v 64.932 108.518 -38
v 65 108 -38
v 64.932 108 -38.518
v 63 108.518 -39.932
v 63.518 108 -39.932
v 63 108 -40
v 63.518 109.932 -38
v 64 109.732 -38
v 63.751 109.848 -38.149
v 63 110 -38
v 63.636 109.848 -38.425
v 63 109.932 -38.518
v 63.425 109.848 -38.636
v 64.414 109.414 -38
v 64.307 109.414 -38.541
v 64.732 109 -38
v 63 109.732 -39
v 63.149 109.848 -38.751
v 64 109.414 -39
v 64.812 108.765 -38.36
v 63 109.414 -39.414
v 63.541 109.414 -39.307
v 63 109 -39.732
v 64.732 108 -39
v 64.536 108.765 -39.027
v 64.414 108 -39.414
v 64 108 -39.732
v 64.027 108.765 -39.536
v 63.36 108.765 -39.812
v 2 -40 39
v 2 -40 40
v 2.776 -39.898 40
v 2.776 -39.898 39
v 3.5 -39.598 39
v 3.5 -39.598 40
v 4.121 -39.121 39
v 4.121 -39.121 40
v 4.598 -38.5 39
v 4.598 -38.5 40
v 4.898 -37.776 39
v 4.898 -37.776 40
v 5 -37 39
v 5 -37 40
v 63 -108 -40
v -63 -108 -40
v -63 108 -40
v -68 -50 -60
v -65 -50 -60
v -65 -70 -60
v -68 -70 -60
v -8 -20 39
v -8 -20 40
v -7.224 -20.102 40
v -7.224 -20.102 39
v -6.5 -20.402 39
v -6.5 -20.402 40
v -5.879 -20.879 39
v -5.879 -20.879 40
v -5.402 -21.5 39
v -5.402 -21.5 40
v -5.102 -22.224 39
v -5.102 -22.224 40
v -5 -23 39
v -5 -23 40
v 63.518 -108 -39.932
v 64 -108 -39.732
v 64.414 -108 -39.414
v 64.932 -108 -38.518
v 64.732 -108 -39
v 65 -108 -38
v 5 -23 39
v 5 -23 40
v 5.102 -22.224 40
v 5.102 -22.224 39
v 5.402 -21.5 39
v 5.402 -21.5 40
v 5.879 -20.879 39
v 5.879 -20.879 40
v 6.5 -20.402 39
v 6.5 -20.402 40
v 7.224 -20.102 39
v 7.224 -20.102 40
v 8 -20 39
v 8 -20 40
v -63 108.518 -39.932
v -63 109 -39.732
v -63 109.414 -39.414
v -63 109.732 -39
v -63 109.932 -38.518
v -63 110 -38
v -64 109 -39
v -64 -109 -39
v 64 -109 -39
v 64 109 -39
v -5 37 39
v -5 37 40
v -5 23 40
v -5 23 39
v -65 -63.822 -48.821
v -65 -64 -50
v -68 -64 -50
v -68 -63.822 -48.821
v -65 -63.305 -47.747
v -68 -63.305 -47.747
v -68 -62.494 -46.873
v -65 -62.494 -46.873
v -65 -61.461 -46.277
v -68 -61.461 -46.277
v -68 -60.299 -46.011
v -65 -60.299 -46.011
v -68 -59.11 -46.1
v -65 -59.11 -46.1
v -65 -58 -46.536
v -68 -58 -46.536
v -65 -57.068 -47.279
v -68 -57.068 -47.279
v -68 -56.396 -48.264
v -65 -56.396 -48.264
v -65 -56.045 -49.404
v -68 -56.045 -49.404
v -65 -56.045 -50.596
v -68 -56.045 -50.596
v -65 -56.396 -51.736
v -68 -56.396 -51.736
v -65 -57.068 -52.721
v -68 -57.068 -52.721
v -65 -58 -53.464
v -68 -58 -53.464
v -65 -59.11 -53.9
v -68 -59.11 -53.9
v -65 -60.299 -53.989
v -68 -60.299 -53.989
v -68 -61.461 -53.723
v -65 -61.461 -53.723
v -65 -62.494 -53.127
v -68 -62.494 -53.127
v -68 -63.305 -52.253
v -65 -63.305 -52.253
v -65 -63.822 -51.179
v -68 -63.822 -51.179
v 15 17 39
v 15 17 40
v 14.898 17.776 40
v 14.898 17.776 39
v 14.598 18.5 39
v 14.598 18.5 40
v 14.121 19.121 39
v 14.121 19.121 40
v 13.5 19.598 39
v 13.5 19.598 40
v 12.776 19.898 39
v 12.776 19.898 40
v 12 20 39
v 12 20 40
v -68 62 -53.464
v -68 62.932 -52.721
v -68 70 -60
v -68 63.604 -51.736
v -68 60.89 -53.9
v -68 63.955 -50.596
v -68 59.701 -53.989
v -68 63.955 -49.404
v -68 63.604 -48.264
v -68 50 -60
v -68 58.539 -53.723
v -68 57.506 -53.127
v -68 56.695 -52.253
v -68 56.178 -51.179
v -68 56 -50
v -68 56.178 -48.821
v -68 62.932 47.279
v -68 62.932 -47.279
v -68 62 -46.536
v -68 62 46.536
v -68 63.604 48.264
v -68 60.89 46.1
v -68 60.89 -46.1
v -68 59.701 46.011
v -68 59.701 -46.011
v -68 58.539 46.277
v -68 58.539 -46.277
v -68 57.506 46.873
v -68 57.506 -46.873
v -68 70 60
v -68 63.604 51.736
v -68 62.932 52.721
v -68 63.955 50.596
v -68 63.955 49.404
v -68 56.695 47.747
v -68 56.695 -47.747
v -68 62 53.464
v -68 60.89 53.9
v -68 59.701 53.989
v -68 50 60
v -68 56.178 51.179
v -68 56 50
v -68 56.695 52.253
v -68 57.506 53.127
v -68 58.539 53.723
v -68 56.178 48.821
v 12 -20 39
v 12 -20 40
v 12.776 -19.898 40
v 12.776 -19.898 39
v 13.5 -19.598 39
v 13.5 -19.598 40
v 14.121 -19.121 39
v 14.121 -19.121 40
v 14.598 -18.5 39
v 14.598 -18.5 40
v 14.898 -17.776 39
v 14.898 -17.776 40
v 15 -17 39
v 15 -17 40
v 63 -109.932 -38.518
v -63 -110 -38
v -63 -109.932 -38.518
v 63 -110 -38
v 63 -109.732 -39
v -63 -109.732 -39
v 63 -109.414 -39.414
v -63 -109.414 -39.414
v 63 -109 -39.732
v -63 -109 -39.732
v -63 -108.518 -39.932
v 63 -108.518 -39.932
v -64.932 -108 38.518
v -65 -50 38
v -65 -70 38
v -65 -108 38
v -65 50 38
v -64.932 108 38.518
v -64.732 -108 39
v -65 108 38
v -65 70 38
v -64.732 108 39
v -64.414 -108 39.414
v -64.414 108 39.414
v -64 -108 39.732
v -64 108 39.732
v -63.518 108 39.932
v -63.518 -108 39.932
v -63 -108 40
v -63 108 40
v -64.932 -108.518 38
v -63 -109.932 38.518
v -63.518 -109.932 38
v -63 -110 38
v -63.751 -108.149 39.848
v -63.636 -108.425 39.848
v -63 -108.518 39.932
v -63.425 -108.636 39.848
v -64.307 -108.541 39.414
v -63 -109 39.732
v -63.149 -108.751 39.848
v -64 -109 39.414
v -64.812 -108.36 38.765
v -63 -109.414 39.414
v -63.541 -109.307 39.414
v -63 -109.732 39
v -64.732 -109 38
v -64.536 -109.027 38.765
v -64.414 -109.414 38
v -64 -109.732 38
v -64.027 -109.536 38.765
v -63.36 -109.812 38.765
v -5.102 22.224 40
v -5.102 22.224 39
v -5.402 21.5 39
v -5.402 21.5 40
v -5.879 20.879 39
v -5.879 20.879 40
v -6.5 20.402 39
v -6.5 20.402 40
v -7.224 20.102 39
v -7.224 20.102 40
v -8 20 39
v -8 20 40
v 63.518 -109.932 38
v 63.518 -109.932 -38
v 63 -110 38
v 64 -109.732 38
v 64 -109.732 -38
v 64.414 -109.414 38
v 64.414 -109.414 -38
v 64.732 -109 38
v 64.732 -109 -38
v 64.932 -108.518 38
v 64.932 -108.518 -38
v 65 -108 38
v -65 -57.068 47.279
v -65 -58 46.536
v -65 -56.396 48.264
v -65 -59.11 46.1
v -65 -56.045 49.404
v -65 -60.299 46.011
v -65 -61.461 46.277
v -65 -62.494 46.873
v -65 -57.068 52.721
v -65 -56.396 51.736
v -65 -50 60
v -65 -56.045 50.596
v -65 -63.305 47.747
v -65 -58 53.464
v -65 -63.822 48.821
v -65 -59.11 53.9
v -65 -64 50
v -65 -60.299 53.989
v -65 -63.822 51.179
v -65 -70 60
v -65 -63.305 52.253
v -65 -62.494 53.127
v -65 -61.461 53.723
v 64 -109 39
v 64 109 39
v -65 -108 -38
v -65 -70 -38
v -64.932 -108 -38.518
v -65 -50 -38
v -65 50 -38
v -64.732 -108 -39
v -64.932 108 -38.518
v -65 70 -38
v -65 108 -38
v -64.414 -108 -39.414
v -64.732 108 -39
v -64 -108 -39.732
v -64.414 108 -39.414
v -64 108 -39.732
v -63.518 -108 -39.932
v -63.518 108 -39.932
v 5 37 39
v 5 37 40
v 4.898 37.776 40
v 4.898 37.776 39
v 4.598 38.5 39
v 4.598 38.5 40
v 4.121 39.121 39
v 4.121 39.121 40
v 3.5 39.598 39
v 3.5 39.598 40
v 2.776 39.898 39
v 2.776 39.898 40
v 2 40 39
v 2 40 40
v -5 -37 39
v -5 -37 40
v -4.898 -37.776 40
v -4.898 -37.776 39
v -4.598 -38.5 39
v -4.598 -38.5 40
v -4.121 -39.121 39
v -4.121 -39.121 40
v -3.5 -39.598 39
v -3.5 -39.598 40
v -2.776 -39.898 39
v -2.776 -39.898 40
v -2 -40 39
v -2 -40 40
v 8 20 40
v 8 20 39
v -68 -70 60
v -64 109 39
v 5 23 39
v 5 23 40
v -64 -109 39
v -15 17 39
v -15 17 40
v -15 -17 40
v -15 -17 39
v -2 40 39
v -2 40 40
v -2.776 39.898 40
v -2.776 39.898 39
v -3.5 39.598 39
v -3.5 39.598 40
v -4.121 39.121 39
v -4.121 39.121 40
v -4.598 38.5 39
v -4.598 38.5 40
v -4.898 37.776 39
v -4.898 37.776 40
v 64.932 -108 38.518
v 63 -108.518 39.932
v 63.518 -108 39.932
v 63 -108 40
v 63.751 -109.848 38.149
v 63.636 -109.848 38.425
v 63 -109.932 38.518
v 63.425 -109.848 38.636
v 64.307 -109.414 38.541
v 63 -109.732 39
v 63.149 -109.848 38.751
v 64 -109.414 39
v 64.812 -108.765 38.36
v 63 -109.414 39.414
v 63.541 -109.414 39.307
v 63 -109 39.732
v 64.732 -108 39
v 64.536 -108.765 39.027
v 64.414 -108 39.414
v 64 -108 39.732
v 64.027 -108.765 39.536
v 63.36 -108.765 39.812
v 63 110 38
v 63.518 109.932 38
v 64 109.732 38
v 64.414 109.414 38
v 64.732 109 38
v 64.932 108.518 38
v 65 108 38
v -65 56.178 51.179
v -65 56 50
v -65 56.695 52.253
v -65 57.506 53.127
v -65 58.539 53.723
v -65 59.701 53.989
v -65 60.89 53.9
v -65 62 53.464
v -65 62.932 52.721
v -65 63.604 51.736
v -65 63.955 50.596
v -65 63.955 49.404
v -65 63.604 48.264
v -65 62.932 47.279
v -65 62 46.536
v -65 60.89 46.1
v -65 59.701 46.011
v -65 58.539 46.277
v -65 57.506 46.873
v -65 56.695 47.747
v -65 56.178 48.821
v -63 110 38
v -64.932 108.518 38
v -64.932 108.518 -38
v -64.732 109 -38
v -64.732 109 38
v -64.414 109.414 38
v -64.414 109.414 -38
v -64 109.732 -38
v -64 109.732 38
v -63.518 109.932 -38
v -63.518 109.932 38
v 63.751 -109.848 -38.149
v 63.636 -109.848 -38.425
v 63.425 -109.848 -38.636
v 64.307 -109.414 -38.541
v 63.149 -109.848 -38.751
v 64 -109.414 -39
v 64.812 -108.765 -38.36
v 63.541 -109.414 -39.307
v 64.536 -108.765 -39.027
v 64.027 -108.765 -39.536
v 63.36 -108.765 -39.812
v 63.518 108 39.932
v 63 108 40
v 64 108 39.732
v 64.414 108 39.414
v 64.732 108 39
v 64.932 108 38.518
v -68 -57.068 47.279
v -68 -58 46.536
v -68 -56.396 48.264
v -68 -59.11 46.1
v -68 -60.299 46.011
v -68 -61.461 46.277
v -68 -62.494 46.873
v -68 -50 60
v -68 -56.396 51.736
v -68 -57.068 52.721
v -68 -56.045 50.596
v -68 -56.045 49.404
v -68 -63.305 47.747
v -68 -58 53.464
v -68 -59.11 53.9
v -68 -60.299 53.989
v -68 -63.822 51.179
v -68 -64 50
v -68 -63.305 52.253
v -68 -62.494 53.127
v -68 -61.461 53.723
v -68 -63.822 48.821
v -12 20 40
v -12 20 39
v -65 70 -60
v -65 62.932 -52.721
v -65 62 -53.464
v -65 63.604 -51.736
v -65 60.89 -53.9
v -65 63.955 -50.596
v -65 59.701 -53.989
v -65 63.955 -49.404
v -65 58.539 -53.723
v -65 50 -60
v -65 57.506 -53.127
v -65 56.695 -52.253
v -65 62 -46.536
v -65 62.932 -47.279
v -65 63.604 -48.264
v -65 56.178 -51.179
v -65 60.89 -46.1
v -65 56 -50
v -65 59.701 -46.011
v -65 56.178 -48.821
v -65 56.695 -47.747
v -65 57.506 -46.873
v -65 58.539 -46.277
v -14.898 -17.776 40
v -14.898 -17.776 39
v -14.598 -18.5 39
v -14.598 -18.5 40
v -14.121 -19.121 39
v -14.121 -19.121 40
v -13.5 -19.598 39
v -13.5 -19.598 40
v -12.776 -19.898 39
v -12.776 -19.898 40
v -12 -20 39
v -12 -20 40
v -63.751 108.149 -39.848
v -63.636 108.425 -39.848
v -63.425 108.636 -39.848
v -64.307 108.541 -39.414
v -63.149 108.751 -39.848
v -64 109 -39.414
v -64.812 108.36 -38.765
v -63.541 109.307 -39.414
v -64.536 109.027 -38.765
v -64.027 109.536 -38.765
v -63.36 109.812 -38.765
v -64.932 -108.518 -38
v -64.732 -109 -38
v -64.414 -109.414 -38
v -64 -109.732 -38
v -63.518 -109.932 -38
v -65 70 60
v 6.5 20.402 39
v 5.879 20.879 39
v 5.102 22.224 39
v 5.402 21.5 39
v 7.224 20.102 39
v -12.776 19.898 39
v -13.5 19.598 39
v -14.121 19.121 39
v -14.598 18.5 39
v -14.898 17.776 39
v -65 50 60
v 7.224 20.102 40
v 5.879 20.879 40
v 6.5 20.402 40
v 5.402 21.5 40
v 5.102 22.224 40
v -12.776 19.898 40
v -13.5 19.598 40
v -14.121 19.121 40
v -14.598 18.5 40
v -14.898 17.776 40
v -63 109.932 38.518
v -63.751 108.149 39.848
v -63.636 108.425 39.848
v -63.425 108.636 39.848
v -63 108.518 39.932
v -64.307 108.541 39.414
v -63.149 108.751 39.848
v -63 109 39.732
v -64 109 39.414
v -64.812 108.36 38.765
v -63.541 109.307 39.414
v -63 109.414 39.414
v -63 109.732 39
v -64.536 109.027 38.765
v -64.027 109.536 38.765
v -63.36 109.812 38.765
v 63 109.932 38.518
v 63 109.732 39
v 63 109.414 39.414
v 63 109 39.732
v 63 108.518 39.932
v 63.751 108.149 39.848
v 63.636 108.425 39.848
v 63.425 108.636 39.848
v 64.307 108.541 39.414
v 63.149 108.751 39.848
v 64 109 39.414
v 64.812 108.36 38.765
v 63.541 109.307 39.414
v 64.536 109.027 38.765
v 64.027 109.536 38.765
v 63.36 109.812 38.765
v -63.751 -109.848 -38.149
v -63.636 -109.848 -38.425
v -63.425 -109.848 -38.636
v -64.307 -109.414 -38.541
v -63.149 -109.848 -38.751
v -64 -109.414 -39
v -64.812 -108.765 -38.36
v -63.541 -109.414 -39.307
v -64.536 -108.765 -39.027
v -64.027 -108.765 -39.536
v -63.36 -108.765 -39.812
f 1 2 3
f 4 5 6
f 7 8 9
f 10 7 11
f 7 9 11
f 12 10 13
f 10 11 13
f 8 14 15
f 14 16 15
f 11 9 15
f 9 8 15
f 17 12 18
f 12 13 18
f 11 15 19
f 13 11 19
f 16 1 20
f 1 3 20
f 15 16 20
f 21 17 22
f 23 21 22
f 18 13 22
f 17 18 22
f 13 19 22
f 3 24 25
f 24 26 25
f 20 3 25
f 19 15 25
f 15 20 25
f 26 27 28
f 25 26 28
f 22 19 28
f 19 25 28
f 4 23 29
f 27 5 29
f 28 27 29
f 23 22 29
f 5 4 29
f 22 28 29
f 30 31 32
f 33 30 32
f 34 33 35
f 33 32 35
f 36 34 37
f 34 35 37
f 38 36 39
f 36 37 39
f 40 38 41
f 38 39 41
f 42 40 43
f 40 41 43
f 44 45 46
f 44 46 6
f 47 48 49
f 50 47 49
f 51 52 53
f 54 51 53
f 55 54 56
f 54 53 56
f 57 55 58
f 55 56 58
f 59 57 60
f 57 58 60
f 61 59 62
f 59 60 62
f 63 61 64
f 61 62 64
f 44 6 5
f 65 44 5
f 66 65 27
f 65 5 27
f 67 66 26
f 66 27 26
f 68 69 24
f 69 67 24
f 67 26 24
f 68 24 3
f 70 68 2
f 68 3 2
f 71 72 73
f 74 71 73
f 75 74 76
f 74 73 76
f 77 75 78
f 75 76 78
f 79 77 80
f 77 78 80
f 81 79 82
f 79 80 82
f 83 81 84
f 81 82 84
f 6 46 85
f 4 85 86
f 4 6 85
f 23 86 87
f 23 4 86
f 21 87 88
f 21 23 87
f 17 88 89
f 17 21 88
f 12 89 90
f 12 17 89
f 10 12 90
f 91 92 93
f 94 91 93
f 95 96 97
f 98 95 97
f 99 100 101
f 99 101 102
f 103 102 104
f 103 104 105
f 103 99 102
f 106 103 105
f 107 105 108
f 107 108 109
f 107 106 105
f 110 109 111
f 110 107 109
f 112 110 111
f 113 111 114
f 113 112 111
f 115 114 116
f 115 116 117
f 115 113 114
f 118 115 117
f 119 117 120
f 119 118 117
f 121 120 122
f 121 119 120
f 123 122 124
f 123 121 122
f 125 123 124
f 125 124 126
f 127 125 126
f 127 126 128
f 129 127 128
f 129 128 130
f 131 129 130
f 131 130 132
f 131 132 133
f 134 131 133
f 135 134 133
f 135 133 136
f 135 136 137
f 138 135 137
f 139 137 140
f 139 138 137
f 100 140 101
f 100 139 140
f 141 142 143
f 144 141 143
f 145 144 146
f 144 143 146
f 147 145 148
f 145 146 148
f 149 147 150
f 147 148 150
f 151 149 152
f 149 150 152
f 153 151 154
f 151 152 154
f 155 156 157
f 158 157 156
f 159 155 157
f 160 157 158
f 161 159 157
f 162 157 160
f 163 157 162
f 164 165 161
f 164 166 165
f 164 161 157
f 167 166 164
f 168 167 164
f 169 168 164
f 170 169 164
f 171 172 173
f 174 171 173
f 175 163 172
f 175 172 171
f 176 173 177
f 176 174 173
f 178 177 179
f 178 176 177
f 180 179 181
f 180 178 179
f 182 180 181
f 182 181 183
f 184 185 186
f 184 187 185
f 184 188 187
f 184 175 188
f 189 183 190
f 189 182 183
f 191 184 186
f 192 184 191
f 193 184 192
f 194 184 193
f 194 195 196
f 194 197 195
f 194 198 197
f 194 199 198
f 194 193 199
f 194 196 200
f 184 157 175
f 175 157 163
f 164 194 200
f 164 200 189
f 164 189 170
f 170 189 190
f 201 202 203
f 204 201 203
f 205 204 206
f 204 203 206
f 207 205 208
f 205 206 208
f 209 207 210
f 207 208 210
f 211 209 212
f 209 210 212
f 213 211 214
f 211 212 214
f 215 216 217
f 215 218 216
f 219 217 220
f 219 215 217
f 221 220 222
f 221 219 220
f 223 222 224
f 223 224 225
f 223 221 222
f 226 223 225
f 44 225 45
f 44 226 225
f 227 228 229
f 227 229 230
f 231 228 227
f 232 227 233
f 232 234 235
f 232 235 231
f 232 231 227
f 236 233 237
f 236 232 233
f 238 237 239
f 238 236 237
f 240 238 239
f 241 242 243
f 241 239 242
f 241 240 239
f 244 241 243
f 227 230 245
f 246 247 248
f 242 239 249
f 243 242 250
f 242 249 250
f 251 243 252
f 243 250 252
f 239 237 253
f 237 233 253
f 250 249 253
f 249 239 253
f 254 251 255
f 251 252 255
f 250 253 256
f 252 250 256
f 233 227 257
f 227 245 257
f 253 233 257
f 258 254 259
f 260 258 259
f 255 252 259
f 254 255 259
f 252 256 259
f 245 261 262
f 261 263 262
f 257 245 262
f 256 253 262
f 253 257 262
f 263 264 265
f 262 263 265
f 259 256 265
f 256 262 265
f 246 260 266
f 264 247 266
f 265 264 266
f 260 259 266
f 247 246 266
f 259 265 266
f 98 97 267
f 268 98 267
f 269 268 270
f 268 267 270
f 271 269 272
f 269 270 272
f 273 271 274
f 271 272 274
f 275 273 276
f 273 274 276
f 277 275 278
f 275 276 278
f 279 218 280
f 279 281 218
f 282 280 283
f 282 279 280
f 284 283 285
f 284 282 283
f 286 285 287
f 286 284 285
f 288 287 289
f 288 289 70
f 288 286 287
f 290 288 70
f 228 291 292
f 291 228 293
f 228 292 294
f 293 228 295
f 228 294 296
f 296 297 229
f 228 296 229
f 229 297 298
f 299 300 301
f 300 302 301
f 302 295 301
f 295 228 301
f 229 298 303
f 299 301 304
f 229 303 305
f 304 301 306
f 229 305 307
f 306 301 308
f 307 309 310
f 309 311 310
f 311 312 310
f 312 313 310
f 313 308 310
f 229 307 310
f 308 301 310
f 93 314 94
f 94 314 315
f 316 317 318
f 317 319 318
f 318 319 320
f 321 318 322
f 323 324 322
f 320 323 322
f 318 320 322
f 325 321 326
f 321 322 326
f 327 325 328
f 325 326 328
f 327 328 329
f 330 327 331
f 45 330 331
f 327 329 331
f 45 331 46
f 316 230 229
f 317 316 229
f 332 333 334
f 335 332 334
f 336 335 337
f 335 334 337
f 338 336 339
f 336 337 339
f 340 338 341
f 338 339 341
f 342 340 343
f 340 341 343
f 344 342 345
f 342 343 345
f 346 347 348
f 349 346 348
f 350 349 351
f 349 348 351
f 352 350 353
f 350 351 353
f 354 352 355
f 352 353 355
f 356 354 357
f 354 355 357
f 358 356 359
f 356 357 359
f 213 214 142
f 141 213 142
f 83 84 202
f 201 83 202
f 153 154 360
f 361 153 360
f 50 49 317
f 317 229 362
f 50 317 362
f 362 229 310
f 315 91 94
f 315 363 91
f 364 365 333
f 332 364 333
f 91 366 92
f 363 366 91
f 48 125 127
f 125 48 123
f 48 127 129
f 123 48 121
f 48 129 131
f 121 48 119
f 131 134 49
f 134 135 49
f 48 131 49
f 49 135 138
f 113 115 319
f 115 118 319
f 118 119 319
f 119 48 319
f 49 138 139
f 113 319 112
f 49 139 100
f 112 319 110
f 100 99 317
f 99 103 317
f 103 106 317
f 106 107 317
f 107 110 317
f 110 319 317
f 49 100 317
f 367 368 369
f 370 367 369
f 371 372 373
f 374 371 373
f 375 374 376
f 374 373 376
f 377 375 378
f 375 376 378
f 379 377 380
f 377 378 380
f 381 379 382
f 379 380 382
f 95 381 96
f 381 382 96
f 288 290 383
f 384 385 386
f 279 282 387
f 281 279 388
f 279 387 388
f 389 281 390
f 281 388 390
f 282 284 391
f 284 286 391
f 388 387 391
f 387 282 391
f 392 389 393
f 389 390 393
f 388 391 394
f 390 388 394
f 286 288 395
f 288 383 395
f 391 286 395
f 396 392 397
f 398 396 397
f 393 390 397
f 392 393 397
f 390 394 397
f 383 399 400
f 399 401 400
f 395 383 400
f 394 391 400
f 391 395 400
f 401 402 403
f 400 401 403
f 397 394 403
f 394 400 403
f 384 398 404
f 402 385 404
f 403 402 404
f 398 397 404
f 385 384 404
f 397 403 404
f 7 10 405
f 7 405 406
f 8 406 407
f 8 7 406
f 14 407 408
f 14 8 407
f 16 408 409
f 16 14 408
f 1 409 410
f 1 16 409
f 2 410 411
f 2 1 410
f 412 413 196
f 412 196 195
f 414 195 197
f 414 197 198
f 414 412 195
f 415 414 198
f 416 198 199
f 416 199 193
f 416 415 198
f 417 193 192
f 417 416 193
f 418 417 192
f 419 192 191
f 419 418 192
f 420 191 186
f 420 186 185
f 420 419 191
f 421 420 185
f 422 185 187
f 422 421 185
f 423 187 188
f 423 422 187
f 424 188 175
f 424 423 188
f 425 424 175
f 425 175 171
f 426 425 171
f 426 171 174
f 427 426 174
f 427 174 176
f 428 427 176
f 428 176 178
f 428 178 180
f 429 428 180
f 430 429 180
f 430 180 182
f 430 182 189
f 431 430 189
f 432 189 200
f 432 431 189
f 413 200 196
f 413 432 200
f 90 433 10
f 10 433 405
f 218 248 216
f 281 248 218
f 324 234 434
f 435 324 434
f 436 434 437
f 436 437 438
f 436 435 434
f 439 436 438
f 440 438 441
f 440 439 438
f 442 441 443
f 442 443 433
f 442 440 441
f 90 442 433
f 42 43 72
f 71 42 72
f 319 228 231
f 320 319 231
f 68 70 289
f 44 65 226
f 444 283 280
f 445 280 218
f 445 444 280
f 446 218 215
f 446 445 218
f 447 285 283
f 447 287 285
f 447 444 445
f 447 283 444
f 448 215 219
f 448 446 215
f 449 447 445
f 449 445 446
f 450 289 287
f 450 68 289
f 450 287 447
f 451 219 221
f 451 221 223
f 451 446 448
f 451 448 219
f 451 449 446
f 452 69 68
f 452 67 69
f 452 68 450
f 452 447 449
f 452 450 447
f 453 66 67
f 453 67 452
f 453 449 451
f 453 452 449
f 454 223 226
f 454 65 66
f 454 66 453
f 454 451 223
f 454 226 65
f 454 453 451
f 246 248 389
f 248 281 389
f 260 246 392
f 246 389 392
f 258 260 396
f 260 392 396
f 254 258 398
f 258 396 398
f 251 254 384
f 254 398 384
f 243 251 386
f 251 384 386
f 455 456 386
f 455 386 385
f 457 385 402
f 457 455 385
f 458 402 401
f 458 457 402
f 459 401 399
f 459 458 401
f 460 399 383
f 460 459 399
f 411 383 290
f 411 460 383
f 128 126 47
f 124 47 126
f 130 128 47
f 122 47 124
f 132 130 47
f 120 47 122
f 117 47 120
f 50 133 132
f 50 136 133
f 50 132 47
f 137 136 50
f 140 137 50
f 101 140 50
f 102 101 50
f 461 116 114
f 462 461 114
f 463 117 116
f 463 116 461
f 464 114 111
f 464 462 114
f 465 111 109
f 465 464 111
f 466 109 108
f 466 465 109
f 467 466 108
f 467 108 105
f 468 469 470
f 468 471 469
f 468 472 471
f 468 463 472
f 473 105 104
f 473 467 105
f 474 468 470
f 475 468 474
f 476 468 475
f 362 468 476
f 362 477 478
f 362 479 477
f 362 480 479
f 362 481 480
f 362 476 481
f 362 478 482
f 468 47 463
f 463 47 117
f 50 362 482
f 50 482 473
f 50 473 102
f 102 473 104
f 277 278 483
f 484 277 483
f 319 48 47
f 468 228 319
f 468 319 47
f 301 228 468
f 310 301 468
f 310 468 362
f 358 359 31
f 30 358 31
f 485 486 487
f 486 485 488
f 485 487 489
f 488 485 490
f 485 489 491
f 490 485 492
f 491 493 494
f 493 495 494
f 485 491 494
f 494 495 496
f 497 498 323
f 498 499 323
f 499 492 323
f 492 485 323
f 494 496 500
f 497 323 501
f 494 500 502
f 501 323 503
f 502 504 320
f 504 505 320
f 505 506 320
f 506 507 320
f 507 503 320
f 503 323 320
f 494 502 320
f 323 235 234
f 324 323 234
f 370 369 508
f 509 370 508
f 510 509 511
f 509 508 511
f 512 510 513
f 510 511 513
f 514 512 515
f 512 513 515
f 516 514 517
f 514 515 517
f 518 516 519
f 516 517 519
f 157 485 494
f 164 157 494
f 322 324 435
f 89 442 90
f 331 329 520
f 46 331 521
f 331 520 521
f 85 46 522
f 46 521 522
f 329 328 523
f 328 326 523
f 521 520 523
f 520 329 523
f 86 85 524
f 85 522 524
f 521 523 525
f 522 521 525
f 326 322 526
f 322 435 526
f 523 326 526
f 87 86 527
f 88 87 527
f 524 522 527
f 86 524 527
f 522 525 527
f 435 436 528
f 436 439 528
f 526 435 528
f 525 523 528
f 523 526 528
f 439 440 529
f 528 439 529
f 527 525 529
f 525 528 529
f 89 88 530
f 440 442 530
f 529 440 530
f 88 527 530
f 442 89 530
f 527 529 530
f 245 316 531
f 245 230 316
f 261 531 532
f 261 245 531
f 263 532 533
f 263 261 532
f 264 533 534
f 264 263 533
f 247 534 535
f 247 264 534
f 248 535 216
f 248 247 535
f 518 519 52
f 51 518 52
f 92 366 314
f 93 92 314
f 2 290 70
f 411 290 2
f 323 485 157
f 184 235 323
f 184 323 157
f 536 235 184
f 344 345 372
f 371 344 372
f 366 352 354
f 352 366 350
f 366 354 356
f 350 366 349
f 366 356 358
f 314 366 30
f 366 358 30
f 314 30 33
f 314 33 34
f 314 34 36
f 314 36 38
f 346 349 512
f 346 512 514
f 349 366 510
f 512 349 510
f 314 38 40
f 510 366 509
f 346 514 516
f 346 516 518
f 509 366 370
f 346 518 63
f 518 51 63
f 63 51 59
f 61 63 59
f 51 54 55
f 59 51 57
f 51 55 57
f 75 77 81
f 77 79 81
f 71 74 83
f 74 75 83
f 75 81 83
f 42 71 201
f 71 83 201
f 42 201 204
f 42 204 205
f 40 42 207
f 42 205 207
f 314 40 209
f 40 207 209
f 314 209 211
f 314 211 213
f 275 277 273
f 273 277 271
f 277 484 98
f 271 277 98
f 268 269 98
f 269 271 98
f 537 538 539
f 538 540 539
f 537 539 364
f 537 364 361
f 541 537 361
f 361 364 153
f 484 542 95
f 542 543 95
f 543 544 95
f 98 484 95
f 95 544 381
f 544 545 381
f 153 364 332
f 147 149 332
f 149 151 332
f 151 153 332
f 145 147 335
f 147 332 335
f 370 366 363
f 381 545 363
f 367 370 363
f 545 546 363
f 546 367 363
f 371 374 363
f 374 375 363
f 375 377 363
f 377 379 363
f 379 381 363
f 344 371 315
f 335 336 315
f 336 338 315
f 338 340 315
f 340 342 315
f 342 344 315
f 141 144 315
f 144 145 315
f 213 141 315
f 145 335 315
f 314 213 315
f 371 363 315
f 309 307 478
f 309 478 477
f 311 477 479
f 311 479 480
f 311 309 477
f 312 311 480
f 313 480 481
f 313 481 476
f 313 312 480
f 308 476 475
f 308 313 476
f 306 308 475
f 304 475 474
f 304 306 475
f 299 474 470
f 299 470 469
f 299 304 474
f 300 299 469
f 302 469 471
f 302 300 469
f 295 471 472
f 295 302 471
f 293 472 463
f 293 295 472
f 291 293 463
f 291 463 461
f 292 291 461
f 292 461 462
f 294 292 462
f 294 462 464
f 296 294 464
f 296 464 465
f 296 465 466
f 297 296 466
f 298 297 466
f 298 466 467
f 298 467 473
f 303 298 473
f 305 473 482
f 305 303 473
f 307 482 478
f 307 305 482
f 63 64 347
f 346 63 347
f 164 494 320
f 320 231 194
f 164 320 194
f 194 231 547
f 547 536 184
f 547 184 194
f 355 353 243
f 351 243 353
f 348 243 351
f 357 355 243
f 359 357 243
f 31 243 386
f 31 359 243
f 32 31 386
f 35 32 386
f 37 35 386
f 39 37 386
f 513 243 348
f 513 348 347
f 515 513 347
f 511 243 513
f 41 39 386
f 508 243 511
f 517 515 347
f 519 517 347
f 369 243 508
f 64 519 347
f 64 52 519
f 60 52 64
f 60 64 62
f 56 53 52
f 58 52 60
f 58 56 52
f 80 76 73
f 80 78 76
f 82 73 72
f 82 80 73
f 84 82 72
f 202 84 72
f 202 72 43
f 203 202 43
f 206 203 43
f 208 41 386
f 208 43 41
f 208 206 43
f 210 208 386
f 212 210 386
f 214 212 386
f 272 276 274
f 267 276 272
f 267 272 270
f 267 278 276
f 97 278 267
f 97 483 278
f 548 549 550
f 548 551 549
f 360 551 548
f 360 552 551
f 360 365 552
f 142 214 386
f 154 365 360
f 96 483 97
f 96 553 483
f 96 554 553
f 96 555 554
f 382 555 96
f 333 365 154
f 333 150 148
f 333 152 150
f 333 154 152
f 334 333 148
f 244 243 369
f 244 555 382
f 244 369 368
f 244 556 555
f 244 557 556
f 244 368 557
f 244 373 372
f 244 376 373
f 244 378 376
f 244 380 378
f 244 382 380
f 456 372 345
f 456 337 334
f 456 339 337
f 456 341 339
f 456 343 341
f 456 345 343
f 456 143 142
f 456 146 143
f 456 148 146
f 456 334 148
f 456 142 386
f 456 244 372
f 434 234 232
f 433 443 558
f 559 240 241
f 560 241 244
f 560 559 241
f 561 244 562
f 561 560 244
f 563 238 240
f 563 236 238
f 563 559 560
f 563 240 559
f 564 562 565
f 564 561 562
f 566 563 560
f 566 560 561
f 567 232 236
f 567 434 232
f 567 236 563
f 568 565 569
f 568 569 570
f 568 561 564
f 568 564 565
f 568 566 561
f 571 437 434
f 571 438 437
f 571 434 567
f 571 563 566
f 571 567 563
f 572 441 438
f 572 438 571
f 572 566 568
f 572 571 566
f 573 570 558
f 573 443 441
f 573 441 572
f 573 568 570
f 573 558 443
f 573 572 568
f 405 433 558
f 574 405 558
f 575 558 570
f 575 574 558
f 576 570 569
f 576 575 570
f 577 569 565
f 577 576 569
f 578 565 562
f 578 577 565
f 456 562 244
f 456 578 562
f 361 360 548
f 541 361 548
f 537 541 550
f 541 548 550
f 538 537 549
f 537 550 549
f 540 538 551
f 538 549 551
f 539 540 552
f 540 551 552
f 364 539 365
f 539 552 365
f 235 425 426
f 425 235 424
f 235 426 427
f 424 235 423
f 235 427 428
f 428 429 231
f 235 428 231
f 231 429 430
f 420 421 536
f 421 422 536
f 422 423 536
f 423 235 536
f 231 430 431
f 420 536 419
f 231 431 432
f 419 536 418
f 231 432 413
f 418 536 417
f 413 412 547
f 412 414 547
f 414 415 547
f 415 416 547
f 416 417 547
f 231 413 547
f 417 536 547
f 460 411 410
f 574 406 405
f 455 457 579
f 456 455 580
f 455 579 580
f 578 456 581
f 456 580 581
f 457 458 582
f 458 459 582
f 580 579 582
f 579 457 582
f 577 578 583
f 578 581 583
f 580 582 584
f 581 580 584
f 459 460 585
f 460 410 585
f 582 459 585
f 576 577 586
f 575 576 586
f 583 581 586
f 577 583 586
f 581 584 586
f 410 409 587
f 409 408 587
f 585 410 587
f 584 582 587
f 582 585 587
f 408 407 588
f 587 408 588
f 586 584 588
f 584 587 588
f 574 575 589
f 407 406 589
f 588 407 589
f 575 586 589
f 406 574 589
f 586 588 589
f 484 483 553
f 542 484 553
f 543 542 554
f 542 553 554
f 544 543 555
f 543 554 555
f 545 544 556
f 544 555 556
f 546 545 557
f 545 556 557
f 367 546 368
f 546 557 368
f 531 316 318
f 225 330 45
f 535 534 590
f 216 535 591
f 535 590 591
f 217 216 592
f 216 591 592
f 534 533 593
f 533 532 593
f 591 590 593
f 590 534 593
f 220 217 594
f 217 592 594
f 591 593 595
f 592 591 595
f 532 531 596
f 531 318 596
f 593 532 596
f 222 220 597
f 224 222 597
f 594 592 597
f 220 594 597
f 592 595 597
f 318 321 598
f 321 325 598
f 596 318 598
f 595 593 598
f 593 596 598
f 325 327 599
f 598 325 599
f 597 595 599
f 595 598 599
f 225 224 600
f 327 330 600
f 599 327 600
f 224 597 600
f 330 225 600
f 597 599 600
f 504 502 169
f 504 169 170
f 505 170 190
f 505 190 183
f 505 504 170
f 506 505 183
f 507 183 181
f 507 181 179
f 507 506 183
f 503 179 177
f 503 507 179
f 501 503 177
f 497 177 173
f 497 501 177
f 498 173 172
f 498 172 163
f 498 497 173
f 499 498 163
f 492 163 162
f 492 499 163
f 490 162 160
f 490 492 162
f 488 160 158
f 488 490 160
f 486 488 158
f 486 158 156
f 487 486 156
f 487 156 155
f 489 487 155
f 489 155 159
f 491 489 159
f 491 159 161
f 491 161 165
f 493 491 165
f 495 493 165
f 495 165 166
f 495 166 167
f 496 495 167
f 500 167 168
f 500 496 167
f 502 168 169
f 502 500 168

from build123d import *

# Parameters (mm, degrees)
F0_W     = 130
F0_H     = 220
F1_DEPTH = 40
F2_T     = -1
F4_DEPTH = 1
F5_R     = 2
F6_W     = 20
F6_H     = 120
F6_R     = 4
F7_DEPTH = 3


with BuildPart() as f1:
    # F0 (on Top) → F1 (new body, symmetric)
    with BuildSketch(Plane.XY):
        Rectangle(F0_W, F0_H)
    extrude(amount=F1_DEPTH, both=True)

    # F2 (hollow: no face is removed)
    offset(amount=F2_T, mode=Mode.SUBTRACT)

    # F3 (on face) → F4 (cut, through all)
    with BuildSketch(Plane.XY.offset(40)):
        with BuildLine():
            Line((2, 40), (-2, 40))
            ThreePointArc((-2, 40), (-4.1213203436, 39.1213203436), (-5, 37))
            Line((-5, 37), (-5, 23))
            ThreePointArc((-5, 23), (-5.8786796564, 20.8786796564), (-8, 20))
            Line((-8, 20), (-12, 20))
            ThreePointArc((-12, 20), (-14.1213203436, 19.1213203436), (-15, 17))
            Line((-15, 17), (-15, -17))
            ThreePointArc((-15, -17), (-14.1213203436, -19.1213203436), (-12, -20))
            Line((-12, -20), (-8, -20))
            ThreePointArc((-8, -20), (-5.8786796564, -20.8786796564), (-5, -23))
            Line((-5, -23), (-5, -37))
            ThreePointArc((-5, -37), (-4.1213203436, -39.1213203436), (-2, -40))
            Line((-2, -40), (2, -40))
            ThreePointArc((2, -40), (4.1213203436, -39.1213203436), (5, -37))
            Line((5, -37), (5, -23))
            ThreePointArc((5, -23), (5.8786796564, -20.8786796564), (8, -20))
            Line((8, -20), (12, -20))
            ThreePointArc((12, -20), (14.1213203436, -19.1213203436), (15, -17))
            Line((15, -17), (15, 17))
            ThreePointArc((15, 17), (14.1213203436, 19.1213203436), (12, 20))
            Line((12, 20), (8, 20))
            ThreePointArc((8, 20), (5.8786796564, 20.8786796564), (5, 23))
            Line((5, 23), (5, 37))
            ThreePointArc((5, 37), (4.1213203436, 39.1213203436), (2, 40))
        make_face()
    extrude(amount=-F4_DEPTH, mode=Mode.SUBTRACT)

    # F5
    f5_edges = [f1.edges().sort_by_distance(p)[0] for p in [
        (65, 0, -40),
        (65, 110, 0),
        (65, 0, 40),
        (65, -110, 0),
        (-65, 110, 0),
        (-65, 0, -40),
        (-65, -110, 0),
        (-65, 0, 40),
        (0, 110, -40),
        (0, -110, -40),
        (0, 110, 40),
        (0, -110, 40),
    ]]
    fillet(f5_edges, radius=F5_R)

    # F6 (on face) → F7 (join)
    with BuildSketch(Plane(origin=(-65, 0, 0), x_dir=(0, -1, 0), z_dir=(-1, 0, 0))):
        with Locations((-60, 0)):
            Rectangle(F6_W, F6_H)
        with Locations((-60, -50)):
            Circle(F6_R, mode=Mode.SUBTRACT)
        with Locations((-60, 50)):
            Circle(F6_R, mode=Mode.SUBTRACT)
        with Locations((60, 0)):
            Rectangle(F6_W, F6_H)
        with Locations((60, -50)):
            Circle(F6_R, mode=Mode.SUBTRACT)
        with Locations((60, 50)):
            Circle(F6_R, mode=Mode.SUBTRACT)
    extrude(amount=F7_DEPTH)


solid = f1.part
